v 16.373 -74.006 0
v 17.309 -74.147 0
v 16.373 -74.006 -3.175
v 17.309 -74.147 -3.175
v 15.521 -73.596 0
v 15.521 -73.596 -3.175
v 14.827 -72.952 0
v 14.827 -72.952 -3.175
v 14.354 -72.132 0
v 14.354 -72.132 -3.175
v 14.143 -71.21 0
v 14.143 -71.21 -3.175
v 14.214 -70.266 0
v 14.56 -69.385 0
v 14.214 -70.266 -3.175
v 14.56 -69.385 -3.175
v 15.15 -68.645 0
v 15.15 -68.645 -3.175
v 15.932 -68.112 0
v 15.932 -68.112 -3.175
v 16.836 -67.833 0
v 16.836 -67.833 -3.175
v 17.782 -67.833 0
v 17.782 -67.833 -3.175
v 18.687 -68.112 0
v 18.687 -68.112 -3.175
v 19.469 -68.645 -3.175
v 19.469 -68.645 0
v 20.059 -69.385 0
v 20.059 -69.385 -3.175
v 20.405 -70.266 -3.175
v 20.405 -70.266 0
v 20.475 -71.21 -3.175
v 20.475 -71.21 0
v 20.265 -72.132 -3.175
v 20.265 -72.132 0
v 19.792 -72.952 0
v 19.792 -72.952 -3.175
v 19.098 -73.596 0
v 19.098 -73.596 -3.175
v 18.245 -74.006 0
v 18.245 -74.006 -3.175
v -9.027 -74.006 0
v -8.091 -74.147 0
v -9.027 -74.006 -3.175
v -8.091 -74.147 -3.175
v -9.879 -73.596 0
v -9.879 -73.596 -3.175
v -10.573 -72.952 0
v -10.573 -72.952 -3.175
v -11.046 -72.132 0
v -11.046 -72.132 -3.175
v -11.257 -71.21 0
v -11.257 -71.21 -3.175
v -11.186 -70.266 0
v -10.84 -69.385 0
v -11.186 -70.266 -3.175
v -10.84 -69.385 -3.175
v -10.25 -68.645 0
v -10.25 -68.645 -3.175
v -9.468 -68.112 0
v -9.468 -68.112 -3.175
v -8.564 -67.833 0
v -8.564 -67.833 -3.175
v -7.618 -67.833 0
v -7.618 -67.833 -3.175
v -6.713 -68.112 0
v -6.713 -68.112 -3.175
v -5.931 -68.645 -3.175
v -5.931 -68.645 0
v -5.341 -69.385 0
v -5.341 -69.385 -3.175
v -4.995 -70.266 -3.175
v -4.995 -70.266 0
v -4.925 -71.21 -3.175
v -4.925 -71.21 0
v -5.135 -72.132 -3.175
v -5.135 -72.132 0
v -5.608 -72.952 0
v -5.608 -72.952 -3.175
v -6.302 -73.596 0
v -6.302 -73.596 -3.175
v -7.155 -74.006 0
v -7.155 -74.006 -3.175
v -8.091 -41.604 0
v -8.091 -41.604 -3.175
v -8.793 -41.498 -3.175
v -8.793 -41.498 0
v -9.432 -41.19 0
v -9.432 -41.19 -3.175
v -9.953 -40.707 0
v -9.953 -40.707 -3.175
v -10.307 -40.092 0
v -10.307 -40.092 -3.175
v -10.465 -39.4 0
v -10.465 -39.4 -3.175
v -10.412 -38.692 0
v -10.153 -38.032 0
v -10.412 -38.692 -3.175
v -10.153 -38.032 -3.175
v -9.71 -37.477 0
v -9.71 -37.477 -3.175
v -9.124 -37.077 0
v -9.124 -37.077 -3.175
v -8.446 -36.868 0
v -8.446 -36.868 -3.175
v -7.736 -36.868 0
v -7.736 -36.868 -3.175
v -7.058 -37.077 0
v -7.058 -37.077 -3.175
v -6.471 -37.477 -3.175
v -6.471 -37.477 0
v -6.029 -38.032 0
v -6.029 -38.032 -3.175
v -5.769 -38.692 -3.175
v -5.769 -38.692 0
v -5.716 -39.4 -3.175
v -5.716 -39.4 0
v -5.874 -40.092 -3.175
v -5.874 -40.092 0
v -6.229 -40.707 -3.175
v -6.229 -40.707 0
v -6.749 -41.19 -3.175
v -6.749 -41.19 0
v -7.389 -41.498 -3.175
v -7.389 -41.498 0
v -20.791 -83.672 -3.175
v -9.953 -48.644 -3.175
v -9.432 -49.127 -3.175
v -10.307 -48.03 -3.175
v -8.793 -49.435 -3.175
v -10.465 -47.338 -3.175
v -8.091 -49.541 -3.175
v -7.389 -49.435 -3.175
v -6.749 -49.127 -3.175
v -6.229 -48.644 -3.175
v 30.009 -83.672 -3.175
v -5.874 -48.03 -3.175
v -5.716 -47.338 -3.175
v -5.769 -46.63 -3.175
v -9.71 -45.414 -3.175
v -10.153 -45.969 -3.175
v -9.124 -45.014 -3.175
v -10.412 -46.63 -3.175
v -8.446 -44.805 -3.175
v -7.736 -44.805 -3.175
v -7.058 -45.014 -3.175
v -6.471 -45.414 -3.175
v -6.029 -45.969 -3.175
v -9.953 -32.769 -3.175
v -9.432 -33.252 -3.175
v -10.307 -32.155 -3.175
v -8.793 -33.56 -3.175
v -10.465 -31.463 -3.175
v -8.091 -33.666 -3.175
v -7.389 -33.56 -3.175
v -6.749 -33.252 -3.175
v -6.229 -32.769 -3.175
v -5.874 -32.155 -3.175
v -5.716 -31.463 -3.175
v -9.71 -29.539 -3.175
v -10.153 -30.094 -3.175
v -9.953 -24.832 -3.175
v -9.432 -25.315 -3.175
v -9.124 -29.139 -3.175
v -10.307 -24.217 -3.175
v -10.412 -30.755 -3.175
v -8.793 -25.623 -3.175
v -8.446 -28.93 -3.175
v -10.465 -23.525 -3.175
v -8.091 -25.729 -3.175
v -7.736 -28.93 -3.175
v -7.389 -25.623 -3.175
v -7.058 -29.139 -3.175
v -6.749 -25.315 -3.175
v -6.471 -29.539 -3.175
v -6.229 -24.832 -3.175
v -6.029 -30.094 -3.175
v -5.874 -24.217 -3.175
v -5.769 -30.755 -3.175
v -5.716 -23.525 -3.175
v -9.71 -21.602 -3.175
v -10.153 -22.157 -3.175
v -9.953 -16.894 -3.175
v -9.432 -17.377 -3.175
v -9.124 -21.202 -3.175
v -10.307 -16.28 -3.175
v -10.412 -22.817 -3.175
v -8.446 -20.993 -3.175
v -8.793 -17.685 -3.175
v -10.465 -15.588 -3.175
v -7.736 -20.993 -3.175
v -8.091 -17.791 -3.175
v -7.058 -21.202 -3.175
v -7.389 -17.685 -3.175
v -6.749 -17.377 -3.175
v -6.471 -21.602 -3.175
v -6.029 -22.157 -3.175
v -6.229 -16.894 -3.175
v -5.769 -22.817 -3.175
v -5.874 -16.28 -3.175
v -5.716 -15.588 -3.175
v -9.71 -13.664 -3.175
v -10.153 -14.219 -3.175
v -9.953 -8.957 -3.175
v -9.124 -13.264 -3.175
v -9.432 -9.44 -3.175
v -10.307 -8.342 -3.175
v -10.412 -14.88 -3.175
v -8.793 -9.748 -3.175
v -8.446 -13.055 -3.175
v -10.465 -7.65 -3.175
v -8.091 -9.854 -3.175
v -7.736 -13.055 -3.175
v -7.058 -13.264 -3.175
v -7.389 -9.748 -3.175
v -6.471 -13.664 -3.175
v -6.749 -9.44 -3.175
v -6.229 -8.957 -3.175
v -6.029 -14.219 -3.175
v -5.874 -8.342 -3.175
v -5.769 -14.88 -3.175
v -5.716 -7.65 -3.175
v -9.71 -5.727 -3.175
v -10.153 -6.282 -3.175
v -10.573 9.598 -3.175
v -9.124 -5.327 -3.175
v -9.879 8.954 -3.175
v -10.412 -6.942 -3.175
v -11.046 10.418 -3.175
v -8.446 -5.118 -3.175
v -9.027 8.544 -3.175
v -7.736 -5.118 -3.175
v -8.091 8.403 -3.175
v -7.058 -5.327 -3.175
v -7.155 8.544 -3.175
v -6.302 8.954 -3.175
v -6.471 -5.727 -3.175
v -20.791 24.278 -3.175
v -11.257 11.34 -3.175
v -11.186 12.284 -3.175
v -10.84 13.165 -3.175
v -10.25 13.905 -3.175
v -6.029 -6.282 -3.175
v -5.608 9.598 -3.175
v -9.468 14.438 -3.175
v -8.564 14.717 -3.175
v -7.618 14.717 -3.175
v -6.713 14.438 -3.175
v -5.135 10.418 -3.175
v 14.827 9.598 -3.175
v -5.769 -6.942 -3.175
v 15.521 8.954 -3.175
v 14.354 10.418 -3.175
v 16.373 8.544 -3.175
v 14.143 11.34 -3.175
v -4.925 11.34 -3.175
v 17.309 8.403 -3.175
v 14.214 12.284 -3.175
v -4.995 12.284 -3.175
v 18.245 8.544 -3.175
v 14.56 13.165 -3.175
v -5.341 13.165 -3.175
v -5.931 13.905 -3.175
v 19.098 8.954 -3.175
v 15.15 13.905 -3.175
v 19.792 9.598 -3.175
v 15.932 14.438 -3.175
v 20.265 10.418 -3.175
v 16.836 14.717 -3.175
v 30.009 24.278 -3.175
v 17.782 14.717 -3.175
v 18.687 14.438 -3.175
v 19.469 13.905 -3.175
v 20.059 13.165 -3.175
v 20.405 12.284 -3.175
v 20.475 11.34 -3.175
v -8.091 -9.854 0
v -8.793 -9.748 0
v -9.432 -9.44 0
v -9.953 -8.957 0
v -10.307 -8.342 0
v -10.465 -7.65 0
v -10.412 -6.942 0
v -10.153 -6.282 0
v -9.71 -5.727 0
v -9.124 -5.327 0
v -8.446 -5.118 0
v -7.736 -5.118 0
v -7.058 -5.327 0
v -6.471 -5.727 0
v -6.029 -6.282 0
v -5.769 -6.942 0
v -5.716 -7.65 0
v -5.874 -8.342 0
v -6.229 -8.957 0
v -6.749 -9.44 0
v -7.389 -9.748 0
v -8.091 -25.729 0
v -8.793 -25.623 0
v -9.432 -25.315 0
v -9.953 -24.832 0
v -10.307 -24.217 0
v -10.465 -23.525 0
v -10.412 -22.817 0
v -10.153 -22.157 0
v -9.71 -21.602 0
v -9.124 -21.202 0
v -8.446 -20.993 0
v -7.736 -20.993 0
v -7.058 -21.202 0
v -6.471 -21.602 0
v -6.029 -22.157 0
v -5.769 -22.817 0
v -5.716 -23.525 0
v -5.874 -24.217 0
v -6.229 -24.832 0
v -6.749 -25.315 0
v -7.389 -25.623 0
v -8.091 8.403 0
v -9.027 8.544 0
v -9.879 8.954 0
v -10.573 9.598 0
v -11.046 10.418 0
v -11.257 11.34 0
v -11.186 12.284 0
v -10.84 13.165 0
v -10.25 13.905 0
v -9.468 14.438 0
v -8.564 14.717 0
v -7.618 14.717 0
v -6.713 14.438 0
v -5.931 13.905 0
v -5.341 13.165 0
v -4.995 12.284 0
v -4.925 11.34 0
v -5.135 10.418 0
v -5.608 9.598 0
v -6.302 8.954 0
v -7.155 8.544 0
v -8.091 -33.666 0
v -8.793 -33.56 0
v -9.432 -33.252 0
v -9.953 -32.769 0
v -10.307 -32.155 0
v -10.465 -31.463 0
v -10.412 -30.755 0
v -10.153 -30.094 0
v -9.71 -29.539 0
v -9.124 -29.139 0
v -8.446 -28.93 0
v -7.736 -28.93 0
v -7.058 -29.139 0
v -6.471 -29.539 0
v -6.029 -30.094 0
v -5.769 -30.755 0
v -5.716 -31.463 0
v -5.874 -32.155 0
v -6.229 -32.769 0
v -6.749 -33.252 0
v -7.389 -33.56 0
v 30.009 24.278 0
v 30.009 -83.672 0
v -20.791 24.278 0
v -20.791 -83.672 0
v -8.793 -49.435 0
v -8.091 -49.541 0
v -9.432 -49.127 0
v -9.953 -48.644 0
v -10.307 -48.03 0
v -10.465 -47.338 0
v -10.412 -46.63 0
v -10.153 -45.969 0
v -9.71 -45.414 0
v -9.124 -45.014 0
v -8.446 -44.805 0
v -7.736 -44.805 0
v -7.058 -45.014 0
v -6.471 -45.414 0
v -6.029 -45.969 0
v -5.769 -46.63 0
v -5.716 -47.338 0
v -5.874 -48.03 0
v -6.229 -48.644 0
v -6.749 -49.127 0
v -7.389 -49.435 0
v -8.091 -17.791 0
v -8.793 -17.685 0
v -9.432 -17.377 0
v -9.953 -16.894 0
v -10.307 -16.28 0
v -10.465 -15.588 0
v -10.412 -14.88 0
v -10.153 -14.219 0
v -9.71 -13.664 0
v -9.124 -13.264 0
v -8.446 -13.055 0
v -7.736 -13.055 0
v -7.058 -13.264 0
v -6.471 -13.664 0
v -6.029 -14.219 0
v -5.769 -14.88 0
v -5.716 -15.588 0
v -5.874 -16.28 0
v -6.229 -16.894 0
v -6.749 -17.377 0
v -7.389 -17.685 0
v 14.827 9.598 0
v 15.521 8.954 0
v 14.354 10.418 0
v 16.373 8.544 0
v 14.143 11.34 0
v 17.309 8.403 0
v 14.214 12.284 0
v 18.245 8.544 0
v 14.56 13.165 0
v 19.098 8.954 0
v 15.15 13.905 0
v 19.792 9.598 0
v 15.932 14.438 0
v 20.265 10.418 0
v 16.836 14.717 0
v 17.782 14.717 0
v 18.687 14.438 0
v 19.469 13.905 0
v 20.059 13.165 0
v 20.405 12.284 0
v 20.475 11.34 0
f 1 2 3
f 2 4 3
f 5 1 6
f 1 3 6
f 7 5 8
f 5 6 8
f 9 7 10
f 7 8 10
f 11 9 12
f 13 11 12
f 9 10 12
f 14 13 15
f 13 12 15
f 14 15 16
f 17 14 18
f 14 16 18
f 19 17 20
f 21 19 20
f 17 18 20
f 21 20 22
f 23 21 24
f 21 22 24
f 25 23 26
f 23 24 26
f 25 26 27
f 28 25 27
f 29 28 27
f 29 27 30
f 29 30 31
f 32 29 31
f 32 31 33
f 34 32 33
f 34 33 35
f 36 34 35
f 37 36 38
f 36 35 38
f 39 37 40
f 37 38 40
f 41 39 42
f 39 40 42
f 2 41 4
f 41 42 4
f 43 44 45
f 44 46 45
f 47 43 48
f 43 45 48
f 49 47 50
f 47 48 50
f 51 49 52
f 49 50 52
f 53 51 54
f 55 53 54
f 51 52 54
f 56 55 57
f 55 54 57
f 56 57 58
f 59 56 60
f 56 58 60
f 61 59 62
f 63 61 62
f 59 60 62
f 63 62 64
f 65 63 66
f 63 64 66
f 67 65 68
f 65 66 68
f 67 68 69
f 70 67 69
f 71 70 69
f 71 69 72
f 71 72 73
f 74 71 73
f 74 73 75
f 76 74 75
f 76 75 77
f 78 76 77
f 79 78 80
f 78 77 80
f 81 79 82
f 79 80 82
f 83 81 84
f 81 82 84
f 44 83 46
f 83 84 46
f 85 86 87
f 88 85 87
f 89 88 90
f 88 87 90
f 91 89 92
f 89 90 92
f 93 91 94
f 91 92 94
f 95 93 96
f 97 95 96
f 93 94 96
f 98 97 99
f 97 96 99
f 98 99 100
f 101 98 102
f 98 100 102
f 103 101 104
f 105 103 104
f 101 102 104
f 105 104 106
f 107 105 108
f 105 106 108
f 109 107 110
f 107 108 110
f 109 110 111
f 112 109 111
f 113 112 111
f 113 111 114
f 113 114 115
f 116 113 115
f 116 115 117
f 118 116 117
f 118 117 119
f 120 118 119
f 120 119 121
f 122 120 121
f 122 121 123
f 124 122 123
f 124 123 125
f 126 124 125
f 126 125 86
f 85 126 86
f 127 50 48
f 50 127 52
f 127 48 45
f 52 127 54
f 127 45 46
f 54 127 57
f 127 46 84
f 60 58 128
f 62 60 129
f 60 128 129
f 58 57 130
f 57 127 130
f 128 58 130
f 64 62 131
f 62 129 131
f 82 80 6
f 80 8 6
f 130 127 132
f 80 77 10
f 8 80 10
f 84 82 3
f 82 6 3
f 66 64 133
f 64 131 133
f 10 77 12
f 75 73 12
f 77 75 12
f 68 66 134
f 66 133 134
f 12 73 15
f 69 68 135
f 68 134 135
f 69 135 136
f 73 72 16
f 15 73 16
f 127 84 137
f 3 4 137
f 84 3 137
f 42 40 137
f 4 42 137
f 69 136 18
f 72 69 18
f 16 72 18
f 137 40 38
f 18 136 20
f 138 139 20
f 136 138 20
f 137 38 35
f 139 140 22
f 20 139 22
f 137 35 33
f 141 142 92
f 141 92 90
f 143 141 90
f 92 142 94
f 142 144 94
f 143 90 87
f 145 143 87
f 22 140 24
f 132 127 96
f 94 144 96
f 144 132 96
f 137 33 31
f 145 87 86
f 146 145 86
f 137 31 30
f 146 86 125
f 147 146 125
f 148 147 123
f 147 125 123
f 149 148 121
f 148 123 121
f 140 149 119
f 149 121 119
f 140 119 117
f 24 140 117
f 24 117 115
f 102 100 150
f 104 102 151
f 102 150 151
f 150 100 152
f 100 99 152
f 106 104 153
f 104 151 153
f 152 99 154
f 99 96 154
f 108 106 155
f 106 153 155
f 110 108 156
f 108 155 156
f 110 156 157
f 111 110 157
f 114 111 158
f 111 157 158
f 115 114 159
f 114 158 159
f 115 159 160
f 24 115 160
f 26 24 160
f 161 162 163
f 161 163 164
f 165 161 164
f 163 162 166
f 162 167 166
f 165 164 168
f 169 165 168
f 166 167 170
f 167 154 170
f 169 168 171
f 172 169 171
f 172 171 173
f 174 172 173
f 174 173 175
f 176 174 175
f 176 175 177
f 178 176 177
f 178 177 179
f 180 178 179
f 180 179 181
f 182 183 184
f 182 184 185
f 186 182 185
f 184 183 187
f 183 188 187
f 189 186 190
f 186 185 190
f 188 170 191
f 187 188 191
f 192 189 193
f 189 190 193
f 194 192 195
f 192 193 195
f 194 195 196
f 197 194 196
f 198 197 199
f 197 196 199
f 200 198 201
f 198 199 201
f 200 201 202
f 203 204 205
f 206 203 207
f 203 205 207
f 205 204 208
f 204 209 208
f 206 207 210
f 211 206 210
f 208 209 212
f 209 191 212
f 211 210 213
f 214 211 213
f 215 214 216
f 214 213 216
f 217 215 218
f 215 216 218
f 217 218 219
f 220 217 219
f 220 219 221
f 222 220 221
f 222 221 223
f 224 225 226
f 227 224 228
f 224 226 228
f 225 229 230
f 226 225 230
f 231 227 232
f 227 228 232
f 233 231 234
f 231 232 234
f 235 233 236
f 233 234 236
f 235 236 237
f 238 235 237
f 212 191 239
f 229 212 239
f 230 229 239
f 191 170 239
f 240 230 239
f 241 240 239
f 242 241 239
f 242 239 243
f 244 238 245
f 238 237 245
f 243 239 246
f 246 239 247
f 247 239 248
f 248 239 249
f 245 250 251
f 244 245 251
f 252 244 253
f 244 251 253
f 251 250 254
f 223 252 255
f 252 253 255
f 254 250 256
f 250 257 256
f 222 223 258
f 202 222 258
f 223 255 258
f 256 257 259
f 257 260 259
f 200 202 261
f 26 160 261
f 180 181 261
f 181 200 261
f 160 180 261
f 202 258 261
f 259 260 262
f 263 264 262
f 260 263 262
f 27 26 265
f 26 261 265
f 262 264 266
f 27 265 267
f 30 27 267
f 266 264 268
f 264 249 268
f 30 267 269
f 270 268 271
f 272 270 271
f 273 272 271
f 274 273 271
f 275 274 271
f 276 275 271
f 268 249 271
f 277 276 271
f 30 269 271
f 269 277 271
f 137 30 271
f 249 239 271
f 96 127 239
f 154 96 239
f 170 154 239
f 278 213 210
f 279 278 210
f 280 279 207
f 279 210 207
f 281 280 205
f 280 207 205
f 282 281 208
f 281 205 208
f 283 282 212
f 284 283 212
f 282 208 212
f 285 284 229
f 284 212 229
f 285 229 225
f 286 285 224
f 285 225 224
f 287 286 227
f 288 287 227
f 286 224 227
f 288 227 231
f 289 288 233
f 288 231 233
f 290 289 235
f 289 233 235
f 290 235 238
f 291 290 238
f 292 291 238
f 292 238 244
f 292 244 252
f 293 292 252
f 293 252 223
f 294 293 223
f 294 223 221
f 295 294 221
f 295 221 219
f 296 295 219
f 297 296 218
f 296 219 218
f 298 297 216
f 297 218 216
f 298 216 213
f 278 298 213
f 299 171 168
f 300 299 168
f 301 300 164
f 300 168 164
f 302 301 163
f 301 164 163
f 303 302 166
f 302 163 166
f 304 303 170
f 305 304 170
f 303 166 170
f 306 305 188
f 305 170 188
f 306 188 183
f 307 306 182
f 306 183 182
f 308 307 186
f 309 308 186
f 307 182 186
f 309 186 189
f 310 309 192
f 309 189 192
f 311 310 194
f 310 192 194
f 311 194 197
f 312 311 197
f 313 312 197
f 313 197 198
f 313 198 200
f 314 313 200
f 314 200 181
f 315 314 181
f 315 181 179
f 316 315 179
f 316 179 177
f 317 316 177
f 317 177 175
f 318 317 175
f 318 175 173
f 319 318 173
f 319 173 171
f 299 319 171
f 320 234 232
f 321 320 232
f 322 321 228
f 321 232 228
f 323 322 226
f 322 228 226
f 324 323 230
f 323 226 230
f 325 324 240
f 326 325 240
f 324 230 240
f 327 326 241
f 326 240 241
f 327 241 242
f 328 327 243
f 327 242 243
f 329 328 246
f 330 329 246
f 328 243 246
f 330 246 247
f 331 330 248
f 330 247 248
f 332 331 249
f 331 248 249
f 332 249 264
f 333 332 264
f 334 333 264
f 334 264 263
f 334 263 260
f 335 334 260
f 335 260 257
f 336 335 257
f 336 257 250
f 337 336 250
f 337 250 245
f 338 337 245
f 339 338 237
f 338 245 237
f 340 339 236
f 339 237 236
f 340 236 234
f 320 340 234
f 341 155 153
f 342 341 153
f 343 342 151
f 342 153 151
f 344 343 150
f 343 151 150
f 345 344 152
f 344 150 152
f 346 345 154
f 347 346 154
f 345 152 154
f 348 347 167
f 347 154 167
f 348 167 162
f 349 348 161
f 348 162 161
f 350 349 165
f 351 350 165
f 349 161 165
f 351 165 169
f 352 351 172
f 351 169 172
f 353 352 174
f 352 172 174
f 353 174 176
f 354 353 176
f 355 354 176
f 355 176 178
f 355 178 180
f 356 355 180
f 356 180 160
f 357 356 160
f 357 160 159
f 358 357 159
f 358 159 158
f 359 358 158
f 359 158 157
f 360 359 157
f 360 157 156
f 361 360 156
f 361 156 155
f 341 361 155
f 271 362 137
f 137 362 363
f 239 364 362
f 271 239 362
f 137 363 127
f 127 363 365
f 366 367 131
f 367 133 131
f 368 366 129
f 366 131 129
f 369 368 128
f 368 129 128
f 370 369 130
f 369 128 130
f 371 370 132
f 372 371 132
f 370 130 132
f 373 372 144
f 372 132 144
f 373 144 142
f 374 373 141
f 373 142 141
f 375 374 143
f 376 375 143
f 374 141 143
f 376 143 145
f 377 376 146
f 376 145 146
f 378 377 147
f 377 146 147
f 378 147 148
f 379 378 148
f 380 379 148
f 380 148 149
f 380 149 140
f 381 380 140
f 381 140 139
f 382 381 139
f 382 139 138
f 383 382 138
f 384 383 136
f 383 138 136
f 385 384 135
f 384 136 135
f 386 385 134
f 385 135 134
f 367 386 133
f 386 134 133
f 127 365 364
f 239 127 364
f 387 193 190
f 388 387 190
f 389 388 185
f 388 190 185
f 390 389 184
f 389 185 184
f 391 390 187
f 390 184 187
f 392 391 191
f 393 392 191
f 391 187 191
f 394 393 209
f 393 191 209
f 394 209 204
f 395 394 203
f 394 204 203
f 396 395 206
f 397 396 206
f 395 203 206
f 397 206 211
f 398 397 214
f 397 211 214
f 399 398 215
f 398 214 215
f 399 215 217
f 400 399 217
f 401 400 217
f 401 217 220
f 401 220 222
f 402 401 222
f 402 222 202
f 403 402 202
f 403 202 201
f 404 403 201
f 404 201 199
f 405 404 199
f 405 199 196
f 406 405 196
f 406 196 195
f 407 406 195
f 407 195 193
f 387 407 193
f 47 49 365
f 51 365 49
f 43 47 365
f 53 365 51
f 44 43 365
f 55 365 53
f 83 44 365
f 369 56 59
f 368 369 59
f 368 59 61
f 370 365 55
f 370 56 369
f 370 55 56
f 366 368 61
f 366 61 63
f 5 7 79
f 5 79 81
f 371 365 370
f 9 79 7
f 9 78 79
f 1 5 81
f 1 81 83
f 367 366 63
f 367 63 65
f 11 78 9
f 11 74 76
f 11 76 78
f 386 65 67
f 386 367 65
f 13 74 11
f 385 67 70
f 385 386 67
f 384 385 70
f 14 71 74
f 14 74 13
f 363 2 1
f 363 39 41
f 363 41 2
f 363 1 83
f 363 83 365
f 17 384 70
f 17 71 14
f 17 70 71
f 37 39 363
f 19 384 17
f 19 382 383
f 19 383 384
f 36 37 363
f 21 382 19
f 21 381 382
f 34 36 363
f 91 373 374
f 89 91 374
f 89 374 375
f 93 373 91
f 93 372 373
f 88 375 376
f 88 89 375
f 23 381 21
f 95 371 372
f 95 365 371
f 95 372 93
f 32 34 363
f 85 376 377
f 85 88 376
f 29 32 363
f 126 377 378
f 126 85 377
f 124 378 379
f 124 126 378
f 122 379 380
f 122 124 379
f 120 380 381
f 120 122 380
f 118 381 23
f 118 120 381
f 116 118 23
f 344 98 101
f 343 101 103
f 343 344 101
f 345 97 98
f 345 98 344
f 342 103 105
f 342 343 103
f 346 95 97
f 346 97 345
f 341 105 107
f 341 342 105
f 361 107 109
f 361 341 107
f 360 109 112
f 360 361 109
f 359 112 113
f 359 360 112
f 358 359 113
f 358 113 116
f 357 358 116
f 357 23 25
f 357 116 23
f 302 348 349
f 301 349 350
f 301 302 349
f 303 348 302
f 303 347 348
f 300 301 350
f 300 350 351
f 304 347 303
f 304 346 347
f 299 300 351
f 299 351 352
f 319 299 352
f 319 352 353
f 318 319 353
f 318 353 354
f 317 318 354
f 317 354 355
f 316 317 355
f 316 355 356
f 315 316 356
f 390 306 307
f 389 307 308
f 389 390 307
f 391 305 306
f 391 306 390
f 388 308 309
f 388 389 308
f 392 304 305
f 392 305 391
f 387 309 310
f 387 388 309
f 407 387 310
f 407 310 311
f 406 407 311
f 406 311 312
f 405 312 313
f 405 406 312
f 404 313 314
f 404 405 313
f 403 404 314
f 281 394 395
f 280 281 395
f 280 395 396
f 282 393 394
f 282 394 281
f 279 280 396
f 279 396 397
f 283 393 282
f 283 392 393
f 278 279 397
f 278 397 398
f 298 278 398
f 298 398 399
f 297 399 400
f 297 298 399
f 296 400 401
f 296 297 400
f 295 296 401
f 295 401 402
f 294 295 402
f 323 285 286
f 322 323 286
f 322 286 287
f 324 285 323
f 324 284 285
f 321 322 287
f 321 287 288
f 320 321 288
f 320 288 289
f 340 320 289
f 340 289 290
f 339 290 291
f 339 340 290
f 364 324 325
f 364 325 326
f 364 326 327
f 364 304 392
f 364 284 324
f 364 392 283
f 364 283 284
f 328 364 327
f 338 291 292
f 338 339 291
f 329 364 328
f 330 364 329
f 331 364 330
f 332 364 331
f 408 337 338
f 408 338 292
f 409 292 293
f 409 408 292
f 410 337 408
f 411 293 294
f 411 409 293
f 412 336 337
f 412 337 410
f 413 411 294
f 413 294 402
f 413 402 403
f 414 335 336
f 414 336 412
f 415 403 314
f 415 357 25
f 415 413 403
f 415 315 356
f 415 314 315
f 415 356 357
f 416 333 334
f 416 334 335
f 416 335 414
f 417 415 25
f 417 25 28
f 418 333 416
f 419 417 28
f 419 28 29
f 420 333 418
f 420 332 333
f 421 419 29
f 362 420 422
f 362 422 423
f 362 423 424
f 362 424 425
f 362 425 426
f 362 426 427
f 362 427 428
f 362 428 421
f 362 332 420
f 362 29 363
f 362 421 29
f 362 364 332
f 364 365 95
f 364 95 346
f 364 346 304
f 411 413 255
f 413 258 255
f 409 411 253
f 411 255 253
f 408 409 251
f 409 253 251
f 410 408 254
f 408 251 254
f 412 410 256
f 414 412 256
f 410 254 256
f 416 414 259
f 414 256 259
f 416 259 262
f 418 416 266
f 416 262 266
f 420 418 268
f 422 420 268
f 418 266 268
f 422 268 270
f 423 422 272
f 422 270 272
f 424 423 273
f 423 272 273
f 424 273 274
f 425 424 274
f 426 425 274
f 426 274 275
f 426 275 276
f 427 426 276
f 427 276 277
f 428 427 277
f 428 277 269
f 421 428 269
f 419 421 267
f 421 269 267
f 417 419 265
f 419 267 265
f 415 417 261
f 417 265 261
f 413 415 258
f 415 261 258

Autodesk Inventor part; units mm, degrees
ref_plane "YZ Plane" through (0, 0, 0) normal (1, 0, 0) x (0, 1, 0)
ref_plane "XZ Plane" through (0, 0, 0) normal (0, 1, 0) x (-1, 0, 0)
ref_plane "XY Plane" through (0, 0, 0) normal (0, 0, 1) x (1, 0, 0)
sketch "Sketch1" plane through (0, 0, 0) normal (0, 0, 1) x (1, 0, 0)
  line L0 (-20.7908, 24.2777) -> (30.0092, 24.2777)
  line L1 (30.0092, 24.2777) -> (30.0092, -83.6723)
  line L2 (30.0092, -83.6723) -> (-20.7908, -83.6723)
  line L3 (-20.7908, -83.6723) -> (-20.7908, 24.2777)
  line L4 (26.8342, 24.2777) -> (26.8342, -1.1223)
  line L5 (26.8342, -1.1223) -> (30.0092, -1.1223)
  line L6 (26.8342, -83.6723) -> (26.8342, -58.2723)
  line L7 (26.8342, -58.2723) -> (30.0092, -58.2723)
  point P0 (0, 0)
  point P1 (-8.0908, 11.5777)
  point P2 (17.3092, 11.5777)
  point P3 (-8.0908, -70.9723)
  point P4 (17.3092, -70.9723)
  point P5 (-8.0908, -7.4723)
  point P6 (-8.0908, -15.4098)
  point P7 (-8.0908, -23.3473)
  point P8 (-8.0908, -31.2848)
  point P9 (-8.0908, -39.2223)
  point P10 (-8.0908, -47.1598)
  dimension "d0" = 50.8
  dimension "d1" = 107.95
  dimension "d2" = 12.7
  dimension "d3" = 12.7
  dimension "d4" = 12.7
  dimension "d5" = 12.7
  dimension "d6" = 12.7
  dimension "d7" = 12.7
  dimension "d8" = 12.7
  dimension "d9" = 12.7
  dimension "d12" = 7.9375
  dimension "d13" = 7.9375
  dimension "d14" = 7.9375
  dimension "d15" = 7.9375
  dimension "d16" = 7.9375
  dimension "d36" = 38.1
  dimension "d37" = 38.1
  dimension "d38" = 38.1
  dimension "d39" = 38.1
  dimension "d40" = 19.05
  dimension "d41" = 38.1
  dimension "d43" = 38.1
  dimension "d44" = 25.4
  dimension "d45" = 3.175
  dimension "d46" = 25.4
  dimension "d47" = 3.175
extrude "Extrusion1" add sketch "Sketch1" against normal blind 3.175
hole "Hole1" at (-8.0908, 11.5777, 0) at (17.3092, 11.5777, 0) at (-8.0908, -70.9723, 0) at (17.3092, -70.9723, 0) direction (0, 0, -1) diameter 6.35 depth 25.4 tip angle 118
hole "Hole2" at (-8.0908, -7.4723, 0) at (-8.0908, -15.4098, 0) at (-8.0908, -23.3473, 0) at (-8.0908, -31.2848, 0) at (-8.0908, -39.2223, 0) at (-8.0908, -47.1598, 0) direction (0, 0, -1) diameter 4.7625 depth 25.4 tip angle 118
properties part number "AS2-8-4-001"
